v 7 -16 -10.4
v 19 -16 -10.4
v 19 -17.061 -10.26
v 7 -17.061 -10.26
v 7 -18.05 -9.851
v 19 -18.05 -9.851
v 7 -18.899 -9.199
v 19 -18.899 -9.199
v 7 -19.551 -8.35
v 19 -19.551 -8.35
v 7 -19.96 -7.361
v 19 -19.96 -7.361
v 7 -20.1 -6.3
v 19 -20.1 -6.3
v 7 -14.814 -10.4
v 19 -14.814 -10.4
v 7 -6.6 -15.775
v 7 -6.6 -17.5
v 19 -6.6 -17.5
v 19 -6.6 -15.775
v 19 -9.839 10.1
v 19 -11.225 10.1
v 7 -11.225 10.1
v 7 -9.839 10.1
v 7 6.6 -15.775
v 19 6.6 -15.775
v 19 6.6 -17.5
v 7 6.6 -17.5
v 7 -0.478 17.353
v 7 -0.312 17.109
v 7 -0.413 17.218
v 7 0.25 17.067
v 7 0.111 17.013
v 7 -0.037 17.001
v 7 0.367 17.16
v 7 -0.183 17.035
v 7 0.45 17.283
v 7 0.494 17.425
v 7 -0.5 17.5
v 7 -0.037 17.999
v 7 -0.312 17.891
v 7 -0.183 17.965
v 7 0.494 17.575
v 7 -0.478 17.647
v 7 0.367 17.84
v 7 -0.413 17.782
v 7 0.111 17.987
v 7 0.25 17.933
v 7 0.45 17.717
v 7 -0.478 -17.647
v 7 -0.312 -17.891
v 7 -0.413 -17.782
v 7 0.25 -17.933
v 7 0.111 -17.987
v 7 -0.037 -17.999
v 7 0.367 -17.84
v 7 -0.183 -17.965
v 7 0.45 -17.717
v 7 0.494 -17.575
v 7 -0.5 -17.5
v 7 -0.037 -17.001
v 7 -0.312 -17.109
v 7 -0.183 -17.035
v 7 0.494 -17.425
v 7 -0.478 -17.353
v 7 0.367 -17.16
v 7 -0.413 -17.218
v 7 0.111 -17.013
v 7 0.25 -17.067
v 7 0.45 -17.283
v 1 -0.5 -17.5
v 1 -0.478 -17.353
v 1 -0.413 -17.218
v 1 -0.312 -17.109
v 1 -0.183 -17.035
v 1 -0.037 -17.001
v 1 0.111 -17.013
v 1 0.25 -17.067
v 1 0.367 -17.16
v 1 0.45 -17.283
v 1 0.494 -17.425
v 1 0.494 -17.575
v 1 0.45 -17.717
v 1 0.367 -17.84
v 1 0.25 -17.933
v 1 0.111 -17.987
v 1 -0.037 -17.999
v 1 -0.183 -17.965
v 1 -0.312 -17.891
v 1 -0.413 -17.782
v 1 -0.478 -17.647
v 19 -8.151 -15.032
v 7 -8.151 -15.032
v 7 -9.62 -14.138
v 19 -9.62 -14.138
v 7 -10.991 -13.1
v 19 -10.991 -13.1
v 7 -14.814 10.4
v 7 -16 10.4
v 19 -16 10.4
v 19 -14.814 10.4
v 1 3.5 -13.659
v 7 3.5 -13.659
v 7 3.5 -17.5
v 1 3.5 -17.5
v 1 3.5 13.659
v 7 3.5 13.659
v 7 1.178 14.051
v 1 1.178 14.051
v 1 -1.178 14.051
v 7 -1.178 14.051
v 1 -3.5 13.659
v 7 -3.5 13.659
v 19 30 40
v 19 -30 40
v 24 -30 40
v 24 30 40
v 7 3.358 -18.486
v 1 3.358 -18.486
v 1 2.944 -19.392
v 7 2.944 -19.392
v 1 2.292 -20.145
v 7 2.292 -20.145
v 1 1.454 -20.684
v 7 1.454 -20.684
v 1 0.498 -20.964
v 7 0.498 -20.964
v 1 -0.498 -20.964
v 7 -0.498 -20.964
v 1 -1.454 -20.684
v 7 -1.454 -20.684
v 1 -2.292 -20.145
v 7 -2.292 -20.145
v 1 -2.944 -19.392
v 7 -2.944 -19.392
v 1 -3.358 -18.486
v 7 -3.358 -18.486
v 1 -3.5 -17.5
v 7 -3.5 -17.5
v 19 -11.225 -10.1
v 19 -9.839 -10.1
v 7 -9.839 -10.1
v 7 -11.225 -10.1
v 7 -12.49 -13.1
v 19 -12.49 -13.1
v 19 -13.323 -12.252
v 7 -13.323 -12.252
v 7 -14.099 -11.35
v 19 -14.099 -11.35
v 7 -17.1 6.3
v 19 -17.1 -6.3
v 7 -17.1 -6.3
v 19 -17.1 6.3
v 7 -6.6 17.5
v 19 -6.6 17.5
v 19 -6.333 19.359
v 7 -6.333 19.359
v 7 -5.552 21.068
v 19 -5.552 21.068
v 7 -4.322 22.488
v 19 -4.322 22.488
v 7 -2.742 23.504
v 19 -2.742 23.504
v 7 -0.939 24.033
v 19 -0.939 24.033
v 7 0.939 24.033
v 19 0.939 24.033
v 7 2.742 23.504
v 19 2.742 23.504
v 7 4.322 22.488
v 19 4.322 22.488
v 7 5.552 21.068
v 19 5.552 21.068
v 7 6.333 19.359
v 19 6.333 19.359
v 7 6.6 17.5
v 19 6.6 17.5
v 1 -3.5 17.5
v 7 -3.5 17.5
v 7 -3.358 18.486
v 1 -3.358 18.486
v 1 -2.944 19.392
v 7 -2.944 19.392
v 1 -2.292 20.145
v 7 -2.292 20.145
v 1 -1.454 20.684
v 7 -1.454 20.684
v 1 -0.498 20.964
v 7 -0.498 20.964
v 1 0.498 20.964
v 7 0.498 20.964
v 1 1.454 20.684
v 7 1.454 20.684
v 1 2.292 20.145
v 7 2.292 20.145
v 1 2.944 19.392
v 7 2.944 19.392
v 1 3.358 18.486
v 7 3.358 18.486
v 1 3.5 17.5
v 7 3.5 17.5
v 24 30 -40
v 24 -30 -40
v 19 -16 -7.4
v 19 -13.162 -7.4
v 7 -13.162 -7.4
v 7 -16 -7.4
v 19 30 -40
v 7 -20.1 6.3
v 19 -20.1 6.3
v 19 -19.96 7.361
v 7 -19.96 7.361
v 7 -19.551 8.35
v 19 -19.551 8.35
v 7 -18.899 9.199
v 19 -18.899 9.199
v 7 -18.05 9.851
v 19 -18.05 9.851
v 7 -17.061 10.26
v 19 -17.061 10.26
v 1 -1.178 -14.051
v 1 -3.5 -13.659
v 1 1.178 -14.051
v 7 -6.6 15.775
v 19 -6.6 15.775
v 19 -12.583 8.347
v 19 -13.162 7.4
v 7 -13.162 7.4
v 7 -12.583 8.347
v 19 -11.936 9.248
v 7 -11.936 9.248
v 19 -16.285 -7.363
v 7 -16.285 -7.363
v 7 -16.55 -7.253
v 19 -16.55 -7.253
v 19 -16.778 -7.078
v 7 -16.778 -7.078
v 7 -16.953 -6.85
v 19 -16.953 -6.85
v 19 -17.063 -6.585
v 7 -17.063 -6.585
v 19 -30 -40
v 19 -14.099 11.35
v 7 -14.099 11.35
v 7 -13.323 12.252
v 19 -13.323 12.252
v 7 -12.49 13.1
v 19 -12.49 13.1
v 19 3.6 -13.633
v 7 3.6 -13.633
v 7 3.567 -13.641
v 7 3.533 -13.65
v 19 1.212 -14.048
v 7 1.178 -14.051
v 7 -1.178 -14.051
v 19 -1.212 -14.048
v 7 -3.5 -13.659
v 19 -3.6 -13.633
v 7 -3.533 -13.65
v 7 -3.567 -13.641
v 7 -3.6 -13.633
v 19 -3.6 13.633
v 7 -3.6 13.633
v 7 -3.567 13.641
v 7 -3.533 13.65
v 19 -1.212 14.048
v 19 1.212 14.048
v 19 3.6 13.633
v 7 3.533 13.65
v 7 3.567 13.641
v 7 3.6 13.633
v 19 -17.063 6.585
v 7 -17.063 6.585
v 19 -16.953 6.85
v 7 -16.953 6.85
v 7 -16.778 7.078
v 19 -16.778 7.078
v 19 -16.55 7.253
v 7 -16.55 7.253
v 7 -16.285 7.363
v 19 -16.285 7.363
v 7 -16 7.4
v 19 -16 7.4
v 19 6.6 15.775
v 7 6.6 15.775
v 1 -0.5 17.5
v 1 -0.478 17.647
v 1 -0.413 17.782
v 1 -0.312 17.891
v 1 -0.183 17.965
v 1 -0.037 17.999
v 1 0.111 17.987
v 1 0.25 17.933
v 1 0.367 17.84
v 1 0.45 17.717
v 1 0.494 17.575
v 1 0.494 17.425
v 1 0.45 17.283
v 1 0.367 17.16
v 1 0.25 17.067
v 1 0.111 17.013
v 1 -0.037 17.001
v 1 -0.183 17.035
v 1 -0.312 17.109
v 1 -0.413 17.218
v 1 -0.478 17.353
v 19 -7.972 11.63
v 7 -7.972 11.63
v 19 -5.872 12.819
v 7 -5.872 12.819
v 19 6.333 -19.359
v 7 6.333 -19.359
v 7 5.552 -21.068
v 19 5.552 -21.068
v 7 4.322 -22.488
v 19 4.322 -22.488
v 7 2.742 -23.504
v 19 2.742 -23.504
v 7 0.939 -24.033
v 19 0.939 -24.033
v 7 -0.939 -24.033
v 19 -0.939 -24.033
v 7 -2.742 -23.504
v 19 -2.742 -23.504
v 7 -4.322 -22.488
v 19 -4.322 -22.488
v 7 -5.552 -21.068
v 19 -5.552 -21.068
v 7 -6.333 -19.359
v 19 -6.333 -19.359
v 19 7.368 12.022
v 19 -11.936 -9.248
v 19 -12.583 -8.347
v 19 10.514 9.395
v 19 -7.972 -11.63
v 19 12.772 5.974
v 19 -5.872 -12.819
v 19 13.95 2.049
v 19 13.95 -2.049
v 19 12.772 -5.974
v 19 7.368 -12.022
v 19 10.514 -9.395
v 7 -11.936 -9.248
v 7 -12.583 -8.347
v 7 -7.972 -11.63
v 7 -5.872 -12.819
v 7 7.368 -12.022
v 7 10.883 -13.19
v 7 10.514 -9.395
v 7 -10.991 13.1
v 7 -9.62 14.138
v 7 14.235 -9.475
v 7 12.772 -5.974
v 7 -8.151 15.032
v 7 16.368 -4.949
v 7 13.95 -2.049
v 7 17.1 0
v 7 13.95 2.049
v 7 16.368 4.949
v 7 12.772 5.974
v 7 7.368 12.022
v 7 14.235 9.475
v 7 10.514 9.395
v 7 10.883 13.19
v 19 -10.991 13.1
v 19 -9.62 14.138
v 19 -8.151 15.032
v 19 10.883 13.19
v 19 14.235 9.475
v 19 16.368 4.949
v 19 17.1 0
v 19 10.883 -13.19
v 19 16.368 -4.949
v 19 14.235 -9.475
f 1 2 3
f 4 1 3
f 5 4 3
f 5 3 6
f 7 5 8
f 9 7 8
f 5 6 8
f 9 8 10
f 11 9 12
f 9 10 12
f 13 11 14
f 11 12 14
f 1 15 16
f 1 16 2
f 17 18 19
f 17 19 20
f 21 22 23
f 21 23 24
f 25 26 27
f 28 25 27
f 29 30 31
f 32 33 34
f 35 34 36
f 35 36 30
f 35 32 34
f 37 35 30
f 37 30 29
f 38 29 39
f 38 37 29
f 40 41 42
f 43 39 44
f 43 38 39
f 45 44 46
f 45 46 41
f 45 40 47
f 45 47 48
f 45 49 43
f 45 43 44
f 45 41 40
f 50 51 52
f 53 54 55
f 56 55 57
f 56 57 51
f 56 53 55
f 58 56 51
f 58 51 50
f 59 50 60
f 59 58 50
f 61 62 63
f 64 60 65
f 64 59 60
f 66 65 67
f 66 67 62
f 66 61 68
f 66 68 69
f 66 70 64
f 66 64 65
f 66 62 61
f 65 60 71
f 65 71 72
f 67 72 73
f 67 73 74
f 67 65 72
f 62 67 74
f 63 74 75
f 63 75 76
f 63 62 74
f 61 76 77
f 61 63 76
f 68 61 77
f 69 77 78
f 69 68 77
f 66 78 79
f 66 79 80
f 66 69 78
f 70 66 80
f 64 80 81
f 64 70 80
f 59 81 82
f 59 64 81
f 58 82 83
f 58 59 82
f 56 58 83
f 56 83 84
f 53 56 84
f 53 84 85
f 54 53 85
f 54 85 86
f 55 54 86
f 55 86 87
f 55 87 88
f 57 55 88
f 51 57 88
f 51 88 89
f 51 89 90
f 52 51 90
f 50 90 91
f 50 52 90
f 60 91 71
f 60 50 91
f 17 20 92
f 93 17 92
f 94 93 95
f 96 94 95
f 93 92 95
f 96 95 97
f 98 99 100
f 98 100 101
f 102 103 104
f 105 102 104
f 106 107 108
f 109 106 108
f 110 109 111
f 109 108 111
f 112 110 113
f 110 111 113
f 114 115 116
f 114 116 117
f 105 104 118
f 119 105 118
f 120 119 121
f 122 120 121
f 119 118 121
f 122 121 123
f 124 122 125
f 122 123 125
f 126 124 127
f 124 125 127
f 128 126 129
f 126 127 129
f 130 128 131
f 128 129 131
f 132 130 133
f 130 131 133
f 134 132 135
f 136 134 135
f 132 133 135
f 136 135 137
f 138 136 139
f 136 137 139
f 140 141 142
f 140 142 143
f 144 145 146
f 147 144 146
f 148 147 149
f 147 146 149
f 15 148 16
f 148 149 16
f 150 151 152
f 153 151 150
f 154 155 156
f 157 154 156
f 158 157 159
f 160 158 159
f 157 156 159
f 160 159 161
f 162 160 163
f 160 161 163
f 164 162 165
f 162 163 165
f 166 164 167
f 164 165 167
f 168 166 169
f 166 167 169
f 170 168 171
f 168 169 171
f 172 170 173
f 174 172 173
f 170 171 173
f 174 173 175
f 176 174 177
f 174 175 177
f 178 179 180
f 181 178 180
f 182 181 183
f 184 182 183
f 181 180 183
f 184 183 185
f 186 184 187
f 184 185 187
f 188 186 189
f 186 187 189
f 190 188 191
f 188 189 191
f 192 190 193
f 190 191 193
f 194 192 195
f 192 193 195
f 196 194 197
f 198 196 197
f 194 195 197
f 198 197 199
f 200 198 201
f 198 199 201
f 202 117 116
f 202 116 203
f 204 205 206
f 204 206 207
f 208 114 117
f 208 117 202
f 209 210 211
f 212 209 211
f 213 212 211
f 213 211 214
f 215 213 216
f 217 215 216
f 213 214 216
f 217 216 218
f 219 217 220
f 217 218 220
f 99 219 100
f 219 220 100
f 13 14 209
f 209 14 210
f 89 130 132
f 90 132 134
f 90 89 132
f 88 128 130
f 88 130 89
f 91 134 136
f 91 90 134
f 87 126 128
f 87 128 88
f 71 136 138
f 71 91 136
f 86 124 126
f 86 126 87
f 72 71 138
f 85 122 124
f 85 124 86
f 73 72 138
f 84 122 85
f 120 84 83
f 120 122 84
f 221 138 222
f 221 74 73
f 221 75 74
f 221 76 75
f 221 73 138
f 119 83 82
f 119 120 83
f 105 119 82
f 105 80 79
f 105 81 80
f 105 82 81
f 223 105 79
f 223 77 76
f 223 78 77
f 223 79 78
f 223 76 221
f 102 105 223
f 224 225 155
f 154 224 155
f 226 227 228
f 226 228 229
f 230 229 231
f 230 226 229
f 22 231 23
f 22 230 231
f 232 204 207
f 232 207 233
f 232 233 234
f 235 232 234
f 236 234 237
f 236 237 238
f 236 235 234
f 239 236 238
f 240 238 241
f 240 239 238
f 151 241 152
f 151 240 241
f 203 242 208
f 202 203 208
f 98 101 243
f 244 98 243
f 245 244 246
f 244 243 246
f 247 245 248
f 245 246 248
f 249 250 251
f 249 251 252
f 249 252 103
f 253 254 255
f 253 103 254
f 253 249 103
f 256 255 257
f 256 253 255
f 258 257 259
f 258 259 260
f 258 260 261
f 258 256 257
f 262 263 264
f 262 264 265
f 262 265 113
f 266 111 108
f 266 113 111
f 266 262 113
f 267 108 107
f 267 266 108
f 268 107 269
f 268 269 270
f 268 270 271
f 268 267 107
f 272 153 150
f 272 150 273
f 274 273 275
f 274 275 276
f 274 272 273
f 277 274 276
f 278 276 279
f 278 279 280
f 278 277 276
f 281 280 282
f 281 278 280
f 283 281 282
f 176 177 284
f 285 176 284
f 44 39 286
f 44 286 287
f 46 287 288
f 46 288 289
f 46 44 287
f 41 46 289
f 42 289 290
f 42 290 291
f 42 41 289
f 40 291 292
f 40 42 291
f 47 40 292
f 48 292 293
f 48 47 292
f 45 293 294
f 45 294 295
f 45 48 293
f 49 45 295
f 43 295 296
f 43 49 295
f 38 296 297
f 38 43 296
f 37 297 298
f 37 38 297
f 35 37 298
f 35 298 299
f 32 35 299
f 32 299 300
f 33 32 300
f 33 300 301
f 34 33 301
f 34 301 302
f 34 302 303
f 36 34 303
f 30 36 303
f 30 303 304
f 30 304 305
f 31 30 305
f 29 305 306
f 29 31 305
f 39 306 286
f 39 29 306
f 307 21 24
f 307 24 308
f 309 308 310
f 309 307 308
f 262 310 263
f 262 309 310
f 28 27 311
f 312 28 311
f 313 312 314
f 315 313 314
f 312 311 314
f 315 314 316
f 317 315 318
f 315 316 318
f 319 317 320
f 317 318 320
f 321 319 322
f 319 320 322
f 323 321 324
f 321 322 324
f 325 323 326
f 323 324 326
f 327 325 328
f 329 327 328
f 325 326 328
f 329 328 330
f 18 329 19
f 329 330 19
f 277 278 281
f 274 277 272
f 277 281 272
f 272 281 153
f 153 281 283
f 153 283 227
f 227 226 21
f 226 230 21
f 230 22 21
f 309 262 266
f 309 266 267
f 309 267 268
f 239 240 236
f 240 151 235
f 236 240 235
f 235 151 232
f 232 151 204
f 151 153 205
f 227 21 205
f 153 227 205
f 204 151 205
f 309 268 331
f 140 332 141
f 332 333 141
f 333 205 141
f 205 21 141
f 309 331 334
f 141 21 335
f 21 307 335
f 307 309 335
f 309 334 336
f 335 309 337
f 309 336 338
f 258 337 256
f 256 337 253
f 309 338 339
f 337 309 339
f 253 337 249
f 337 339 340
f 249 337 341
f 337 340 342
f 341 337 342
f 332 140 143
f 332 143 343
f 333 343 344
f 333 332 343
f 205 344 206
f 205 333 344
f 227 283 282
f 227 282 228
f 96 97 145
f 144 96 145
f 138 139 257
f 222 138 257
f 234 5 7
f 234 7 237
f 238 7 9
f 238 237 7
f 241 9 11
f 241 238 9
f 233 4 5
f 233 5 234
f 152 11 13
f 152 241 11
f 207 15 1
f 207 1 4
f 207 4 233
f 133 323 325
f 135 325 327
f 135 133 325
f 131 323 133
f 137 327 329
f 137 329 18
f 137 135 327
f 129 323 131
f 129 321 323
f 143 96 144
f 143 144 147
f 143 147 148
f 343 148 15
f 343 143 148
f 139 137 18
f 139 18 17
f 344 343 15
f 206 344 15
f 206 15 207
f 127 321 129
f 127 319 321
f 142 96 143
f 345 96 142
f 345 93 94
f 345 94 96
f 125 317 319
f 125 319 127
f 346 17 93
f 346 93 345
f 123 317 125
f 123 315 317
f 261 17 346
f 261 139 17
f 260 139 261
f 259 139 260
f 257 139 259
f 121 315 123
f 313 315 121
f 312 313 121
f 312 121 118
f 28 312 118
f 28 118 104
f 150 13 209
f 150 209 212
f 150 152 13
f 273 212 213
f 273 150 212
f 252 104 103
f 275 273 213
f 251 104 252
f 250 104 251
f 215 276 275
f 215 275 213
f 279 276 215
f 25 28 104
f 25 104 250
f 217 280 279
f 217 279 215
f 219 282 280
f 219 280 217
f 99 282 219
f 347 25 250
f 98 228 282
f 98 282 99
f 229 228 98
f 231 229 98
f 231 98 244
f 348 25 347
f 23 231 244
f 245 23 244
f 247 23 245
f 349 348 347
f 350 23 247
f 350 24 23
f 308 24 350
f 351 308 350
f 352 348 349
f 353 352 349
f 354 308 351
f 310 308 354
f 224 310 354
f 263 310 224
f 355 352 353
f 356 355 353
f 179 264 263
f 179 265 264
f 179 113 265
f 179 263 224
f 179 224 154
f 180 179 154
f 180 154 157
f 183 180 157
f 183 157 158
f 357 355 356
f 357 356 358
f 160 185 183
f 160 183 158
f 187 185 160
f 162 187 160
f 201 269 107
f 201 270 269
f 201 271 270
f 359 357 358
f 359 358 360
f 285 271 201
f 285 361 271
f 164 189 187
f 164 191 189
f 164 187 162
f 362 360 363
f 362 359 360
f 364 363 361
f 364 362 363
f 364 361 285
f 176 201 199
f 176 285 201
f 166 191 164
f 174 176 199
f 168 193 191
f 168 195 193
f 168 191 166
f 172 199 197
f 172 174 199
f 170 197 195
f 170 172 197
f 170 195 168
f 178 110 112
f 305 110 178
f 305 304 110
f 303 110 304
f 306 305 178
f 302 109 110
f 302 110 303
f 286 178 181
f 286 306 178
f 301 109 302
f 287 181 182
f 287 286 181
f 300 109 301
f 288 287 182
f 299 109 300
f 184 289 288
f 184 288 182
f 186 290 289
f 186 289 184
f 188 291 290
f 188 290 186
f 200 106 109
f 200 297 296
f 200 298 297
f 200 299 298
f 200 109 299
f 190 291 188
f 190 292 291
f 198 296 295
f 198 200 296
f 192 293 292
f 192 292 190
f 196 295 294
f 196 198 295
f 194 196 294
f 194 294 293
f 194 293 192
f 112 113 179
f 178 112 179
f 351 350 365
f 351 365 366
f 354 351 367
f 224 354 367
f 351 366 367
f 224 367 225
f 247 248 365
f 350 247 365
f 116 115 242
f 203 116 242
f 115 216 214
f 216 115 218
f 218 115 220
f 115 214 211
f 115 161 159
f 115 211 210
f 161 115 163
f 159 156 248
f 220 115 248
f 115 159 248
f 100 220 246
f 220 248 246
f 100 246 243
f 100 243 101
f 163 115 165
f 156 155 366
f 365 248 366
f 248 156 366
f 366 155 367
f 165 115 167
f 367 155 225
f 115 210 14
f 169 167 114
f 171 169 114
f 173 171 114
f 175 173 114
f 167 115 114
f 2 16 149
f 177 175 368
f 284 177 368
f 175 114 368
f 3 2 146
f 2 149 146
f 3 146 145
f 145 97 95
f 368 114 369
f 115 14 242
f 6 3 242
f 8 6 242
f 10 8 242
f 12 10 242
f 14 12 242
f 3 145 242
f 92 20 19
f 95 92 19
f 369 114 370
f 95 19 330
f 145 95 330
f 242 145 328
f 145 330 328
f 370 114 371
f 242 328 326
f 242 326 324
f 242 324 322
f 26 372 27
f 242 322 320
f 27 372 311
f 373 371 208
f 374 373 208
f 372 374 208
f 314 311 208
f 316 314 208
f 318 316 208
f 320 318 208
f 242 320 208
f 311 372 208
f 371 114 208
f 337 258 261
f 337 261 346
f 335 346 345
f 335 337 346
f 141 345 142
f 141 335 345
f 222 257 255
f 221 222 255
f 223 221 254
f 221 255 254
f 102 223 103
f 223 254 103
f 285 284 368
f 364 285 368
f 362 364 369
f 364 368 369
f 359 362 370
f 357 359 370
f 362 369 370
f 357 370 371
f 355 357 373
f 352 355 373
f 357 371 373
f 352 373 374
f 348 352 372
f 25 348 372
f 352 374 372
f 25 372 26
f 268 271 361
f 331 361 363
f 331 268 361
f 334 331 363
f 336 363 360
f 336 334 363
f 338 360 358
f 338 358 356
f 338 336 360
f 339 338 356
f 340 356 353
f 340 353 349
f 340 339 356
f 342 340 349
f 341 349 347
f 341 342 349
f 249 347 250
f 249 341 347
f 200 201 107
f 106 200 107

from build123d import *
from build123d.topology import SkipClean

# Parameters (mm, degrees)
BOSS_EXTRUDE1_DEPTH = 12
SKETCH2_R           = 0.5
BOSS_EXTRUDE2_DEPTH = 6
SKETCH3_W           = 80
SKETCH3_H           = 60
BOSS_EXTRUDE3_DEPTH = 5


with BuildPart() as part:
    # Sketch1 → Boss-Extrude1 (new body)
    with BuildSketch(Plane(origin=(19, 0, 0), x_dir=(0, 0, -1), z_dir=(1, 0, 0))):
        with BuildLine():
            Line((-17.5, 6.6), (-15.77498019, 6.6))
            ThreePointArc((-15.77498019, 6.6), (0, 17.1), (15.77498019, 6.6))
            Line((15.77498019, 6.6), (17.5, 6.6))
            ThreePointArc((17.5, 6.6), (24.1, 0), (17.5, -6.6))
            Line((17.5, -6.6), (15.77498019, -6.6))
            ThreePointArc((15.77498019, -6.6), (14.603463036, -8.896564918), (13.1, -10.990905331))
            Line((13.1, -10.990905331), (13.1, -12.489995997))
            ThreePointArc((13.1, -12.489995997), (11.807309956, -13.718506901), (10.4, -14.813844876))
            Line((10.4, -14.813844876), (10.4, -16))
            ThreePointArc((10.4, -16), (9.199137803, -18.899137803), (6.3, -20.1))
            Line((6.3, -20.1), (-6.3, -20.1))
            ThreePointArc((-6.3, -20.1), (-9.199137803, -18.899137803), (-10.4, -16))
            Line((-10.4, -16), (-10.4, -14.813844876))
            ThreePointArc((-10.4, -14.813844876), (-11.807309956, -13.718506901), (-13.1, -12.489995997))
            Line((-13.1, -12.489995997), (-13.1, -10.990905331))
            ThreePointArc((-13.1, -10.990905331), (-14.603463036, -8.896564918), (-15.77498019, -6.6))
            Line((-15.77498019, -6.6), (-17.5, -6.6))
            ThreePointArc((-17.5, -6.6), (-24.1, 0), (-17.5, 6.6))
        make_face()
        with BuildLine():
            Line((10.1, -9.838699101), (10.1, -11.22497216))
            ThreePointArc((10.1, -11.22497216), (8.803462488, -12.268212919), (7.4, -13.162446581))
            Line((7.4, -13.162446581), (7.4, -16))
            ThreePointArc((7.4, -16), (7.077817459, -16.777817459), (6.3, -17.1))
            Line((6.3, -17.1), (-6.3, -17.1))
            ThreePointArc((-6.3, -17.1), (-7.077817459, -16.777817459), (-7.4, -16))
            Line((-7.4, -16), (-7.4, -13.162446581))
            ThreePointArc((-7.4, -13.162446581), (-8.803462488, -12.268212919), (-10.1, -11.22497216))
            Line((-10.1, -11.22497216), (-10.1, -9.838699101))
            ThreePointArc((-10.1, -9.838699101), (-12.269489895, -6.947633965), (-13.632681321, -3.6))
            ThreePointArc((-13.632681321, -3.6), (-14.1, 0), (-13.632681321, 3.6))
            ThreePointArc((-13.632681321, 3.6), (0, 14.1), (13.632681321, 3.6))
            ThreePointArc((13.632681321, 3.6), (14.1, 0), (13.632681321, -3.6))
            ThreePointArc((13.632681321, -3.6), (12.269489895, -6.947633965), (10.1, -9.838699101))
        make_face(mode=Mode.SUBTRACT)
    extrude(amount=-BOSS_EXTRUDE1_DEPTH)

    # Sketch2 → Boss-Extrude2 (add)
    # profile 1 of 2: a face of its own
    with SkipClean():  # the faces are left unmerged after this step: merging them gives an invalid solid
        with BuildSketch(Plane.ZY.offset(-7)):
            with BuildLine():
                Line((17.5, 3.5), (13.658696863, 3.5))
                ThreePointArc((13.658696863, 3.5), (14.1, 0), (13.658696863, -3.5))
                Line((13.658696863, -3.5), (17.5, -3.5))
                ThreePointArc((17.5, -3.5), (21, 0), (17.5, 3.5))
            make_face()
            with Locations(Location((17.5, 0, 0), (0, 0, 270))):
                Circle(SKETCH2_R, mode=Mode.SUBTRACT)
        # profile 2 of 2: a face of its own
        with BuildSketch(Plane.ZY.offset(-7)):
            with BuildLine():
                Line((-13.658696863, 3.5), (-17.5, 3.5))
                ThreePointArc((-17.5, 3.5), (-21, 0), (-17.5, -3.5))
                Line((-17.5, -3.5), (-13.658696863, -3.5))
                ThreePointArc((-13.658696863, -3.5), (-14.1, 0), (-13.658696863, 3.5))
            make_face()
            with Locations(Location((-17.5, 0, 0), (0, 0, 270))):
                Circle(SKETCH2_R, mode=Mode.SUBTRACT)
        extrude(amount=BOSS_EXTRUDE2_DEPTH)

    # Sketch3 → Boss-Extrude3 (add)
    with SkipClean():  # the faces are left unmerged after this step: merging them gives an invalid solid
        with BuildSketch(Plane(origin=(19, 0, 0), x_dir=(0, 0, -1), z_dir=(1, 0, 0))):
            Rectangle(SKETCH3_W, SKETCH3_H)
        extrude(amount=BOSS_EXTRUDE3_DEPTH)


solid = part.part
